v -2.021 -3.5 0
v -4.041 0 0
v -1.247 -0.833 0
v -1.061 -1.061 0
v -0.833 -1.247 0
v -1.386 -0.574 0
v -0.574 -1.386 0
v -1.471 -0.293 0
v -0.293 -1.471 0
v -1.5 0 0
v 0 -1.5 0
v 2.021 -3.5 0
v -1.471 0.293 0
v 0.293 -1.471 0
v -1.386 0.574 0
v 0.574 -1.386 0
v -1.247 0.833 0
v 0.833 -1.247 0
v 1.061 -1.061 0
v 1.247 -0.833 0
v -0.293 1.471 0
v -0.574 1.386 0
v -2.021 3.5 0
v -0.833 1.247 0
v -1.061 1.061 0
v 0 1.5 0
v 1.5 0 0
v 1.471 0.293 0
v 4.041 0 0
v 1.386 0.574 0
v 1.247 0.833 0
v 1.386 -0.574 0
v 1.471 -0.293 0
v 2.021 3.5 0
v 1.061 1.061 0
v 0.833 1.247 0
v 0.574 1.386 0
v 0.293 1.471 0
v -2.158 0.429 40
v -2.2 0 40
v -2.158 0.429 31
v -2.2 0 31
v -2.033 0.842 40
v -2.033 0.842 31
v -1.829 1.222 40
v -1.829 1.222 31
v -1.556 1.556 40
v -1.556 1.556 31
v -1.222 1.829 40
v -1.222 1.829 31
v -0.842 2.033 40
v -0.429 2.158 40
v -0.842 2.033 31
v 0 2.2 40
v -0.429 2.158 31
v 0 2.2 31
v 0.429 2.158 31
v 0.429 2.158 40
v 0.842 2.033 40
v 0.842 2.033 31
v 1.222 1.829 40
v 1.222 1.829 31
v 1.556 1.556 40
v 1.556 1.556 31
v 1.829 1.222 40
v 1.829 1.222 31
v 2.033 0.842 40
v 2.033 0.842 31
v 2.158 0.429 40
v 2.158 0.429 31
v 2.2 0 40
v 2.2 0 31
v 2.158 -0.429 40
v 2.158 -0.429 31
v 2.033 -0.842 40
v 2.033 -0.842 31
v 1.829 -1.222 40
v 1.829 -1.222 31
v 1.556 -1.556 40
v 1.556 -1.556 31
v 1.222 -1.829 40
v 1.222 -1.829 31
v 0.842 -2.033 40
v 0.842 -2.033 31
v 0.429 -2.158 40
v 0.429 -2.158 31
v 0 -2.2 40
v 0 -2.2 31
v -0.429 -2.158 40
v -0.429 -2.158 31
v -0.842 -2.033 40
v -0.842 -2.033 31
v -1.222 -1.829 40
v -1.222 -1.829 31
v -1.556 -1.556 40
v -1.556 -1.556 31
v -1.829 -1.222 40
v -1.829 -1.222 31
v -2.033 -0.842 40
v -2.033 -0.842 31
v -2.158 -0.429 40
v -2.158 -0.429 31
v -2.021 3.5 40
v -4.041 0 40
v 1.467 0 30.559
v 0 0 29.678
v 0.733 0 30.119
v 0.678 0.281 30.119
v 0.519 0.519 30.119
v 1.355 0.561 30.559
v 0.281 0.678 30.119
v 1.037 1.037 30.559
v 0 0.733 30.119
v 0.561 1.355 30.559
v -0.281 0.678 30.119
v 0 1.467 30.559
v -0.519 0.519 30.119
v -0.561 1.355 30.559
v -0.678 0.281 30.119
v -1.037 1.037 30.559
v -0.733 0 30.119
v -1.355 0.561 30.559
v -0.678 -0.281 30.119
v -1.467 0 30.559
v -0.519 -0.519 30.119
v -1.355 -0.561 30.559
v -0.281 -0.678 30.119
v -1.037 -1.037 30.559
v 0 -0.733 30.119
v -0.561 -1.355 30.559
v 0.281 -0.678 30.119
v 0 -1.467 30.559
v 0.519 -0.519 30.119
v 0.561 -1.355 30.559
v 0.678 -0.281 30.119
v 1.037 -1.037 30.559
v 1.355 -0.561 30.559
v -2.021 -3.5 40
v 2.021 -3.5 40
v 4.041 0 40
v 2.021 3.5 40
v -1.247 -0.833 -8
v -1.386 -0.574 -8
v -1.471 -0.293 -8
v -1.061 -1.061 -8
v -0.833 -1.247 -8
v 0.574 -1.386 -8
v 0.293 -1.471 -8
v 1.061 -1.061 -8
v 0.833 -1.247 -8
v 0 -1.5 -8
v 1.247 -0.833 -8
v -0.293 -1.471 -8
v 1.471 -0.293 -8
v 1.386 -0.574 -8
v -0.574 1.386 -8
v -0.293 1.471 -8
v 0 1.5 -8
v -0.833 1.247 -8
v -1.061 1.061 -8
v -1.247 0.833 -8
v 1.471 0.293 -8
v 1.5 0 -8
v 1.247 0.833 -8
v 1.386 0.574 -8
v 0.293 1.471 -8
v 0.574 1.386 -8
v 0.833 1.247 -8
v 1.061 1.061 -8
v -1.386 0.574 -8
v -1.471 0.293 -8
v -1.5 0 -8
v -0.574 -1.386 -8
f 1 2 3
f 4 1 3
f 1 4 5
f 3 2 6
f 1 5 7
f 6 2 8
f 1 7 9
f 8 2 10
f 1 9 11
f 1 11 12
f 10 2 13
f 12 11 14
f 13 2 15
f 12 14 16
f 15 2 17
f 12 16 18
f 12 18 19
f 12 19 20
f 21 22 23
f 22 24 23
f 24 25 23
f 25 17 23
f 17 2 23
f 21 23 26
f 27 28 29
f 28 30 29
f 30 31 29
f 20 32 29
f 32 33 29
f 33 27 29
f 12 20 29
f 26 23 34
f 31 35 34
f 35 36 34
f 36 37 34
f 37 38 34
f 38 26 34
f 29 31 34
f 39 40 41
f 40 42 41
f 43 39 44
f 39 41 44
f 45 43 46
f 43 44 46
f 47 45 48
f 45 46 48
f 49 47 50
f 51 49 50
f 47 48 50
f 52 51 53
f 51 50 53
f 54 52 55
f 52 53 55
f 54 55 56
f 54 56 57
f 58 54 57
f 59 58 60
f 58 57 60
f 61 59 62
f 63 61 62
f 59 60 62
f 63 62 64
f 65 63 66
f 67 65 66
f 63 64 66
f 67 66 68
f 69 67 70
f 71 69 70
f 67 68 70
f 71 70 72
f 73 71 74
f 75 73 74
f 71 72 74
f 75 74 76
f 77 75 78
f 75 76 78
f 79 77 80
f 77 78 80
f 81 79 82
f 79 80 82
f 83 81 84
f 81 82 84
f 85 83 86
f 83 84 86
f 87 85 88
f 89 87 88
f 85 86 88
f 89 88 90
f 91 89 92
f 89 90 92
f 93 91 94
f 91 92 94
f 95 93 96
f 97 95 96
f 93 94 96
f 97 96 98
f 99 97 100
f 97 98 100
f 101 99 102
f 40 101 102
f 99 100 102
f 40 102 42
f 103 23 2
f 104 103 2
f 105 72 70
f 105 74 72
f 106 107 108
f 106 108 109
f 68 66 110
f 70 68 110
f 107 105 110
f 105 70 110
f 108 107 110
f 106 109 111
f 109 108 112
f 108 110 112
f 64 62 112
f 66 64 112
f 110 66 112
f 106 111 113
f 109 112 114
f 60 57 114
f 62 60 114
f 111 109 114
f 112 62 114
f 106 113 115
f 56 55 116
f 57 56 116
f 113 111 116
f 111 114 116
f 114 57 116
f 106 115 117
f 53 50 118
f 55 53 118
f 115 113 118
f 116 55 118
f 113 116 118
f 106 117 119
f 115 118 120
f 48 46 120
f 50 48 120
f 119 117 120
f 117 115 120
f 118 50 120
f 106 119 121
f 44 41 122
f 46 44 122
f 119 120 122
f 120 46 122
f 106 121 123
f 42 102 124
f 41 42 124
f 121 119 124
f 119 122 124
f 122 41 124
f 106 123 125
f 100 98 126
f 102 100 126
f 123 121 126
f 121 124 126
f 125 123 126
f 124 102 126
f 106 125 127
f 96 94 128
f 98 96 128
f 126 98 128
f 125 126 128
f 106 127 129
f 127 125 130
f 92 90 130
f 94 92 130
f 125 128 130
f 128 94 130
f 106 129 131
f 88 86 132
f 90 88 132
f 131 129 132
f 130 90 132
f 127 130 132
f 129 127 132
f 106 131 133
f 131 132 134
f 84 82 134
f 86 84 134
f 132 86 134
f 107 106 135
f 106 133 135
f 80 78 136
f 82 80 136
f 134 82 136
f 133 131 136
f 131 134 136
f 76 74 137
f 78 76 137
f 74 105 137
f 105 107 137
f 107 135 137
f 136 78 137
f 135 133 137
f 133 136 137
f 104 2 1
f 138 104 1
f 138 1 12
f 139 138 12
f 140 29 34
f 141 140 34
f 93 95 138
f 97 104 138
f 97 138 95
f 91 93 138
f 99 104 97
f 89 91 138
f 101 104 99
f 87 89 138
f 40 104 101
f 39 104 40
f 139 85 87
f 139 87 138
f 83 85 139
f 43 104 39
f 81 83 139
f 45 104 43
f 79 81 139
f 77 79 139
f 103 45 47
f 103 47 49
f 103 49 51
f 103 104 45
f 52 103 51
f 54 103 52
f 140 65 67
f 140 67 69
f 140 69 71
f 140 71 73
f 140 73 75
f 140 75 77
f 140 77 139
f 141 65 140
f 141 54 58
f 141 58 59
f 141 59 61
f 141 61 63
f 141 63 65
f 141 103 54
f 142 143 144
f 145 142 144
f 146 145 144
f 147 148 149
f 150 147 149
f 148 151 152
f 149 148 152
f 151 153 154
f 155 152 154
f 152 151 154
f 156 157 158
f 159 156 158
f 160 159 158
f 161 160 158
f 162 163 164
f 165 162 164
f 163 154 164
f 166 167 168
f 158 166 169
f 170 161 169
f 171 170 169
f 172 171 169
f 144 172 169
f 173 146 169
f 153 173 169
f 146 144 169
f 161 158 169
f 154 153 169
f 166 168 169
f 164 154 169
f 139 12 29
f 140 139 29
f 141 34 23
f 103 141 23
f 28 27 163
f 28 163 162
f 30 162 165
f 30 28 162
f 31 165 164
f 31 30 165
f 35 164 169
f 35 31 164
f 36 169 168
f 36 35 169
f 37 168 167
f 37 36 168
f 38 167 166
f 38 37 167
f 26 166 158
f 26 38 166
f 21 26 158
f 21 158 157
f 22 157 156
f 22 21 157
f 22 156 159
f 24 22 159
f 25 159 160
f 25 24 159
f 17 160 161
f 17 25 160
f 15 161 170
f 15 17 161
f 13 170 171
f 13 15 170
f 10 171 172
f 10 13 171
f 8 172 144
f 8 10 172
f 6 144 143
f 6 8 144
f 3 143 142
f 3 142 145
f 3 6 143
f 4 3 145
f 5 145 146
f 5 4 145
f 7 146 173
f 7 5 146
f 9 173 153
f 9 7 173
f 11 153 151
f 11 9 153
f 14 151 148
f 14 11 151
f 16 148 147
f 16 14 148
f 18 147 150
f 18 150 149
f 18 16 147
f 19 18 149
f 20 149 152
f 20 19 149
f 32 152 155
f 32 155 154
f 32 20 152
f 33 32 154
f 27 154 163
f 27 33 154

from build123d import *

# Parameters (mm, degrees)
F0_R     = 1.5
F1_DEPTH = 40
F2_DEPTH = 8
F4_D     = 4.4
F4_DEPTH = 9
F4_TIP   = 1.3218933619


with BuildPart() as f1:
    # F0 (on Top) → F1 (new body)
    with BuildSketch(Plane.XY):
        Polygon((4.0414518843, 0), (2.0207259422, 3.5), (-2.0207259422, 3.5), (-4.0414518843, 0), (-2.0207259422, -3.5), (2.0207259422, -3.5), align=None)
        Circle(F0_R, mode=Mode.SUBTRACT)
        Circle(F0_R)
    extrude(amount=F1_DEPTH)

    # F0 (on Top) → F2 (join)
    with BuildSketch(Plane.XY):
        Circle(F0_R)
    extrude(amount=-F2_DEPTH)

    # F4
    with Locations(Plane.XY.offset(40)):
        with Locations((0, 0)):
            Hole(F4_D / 2, depth=F4_DEPTH)
            with Locations((0, 0, -(F4_DEPTH + F4_TIP / 2))):  # 118° drill point
                Cone(0, F4_D / 2, F4_TIP, mode=Mode.SUBTRACT)


solid = f1.part
